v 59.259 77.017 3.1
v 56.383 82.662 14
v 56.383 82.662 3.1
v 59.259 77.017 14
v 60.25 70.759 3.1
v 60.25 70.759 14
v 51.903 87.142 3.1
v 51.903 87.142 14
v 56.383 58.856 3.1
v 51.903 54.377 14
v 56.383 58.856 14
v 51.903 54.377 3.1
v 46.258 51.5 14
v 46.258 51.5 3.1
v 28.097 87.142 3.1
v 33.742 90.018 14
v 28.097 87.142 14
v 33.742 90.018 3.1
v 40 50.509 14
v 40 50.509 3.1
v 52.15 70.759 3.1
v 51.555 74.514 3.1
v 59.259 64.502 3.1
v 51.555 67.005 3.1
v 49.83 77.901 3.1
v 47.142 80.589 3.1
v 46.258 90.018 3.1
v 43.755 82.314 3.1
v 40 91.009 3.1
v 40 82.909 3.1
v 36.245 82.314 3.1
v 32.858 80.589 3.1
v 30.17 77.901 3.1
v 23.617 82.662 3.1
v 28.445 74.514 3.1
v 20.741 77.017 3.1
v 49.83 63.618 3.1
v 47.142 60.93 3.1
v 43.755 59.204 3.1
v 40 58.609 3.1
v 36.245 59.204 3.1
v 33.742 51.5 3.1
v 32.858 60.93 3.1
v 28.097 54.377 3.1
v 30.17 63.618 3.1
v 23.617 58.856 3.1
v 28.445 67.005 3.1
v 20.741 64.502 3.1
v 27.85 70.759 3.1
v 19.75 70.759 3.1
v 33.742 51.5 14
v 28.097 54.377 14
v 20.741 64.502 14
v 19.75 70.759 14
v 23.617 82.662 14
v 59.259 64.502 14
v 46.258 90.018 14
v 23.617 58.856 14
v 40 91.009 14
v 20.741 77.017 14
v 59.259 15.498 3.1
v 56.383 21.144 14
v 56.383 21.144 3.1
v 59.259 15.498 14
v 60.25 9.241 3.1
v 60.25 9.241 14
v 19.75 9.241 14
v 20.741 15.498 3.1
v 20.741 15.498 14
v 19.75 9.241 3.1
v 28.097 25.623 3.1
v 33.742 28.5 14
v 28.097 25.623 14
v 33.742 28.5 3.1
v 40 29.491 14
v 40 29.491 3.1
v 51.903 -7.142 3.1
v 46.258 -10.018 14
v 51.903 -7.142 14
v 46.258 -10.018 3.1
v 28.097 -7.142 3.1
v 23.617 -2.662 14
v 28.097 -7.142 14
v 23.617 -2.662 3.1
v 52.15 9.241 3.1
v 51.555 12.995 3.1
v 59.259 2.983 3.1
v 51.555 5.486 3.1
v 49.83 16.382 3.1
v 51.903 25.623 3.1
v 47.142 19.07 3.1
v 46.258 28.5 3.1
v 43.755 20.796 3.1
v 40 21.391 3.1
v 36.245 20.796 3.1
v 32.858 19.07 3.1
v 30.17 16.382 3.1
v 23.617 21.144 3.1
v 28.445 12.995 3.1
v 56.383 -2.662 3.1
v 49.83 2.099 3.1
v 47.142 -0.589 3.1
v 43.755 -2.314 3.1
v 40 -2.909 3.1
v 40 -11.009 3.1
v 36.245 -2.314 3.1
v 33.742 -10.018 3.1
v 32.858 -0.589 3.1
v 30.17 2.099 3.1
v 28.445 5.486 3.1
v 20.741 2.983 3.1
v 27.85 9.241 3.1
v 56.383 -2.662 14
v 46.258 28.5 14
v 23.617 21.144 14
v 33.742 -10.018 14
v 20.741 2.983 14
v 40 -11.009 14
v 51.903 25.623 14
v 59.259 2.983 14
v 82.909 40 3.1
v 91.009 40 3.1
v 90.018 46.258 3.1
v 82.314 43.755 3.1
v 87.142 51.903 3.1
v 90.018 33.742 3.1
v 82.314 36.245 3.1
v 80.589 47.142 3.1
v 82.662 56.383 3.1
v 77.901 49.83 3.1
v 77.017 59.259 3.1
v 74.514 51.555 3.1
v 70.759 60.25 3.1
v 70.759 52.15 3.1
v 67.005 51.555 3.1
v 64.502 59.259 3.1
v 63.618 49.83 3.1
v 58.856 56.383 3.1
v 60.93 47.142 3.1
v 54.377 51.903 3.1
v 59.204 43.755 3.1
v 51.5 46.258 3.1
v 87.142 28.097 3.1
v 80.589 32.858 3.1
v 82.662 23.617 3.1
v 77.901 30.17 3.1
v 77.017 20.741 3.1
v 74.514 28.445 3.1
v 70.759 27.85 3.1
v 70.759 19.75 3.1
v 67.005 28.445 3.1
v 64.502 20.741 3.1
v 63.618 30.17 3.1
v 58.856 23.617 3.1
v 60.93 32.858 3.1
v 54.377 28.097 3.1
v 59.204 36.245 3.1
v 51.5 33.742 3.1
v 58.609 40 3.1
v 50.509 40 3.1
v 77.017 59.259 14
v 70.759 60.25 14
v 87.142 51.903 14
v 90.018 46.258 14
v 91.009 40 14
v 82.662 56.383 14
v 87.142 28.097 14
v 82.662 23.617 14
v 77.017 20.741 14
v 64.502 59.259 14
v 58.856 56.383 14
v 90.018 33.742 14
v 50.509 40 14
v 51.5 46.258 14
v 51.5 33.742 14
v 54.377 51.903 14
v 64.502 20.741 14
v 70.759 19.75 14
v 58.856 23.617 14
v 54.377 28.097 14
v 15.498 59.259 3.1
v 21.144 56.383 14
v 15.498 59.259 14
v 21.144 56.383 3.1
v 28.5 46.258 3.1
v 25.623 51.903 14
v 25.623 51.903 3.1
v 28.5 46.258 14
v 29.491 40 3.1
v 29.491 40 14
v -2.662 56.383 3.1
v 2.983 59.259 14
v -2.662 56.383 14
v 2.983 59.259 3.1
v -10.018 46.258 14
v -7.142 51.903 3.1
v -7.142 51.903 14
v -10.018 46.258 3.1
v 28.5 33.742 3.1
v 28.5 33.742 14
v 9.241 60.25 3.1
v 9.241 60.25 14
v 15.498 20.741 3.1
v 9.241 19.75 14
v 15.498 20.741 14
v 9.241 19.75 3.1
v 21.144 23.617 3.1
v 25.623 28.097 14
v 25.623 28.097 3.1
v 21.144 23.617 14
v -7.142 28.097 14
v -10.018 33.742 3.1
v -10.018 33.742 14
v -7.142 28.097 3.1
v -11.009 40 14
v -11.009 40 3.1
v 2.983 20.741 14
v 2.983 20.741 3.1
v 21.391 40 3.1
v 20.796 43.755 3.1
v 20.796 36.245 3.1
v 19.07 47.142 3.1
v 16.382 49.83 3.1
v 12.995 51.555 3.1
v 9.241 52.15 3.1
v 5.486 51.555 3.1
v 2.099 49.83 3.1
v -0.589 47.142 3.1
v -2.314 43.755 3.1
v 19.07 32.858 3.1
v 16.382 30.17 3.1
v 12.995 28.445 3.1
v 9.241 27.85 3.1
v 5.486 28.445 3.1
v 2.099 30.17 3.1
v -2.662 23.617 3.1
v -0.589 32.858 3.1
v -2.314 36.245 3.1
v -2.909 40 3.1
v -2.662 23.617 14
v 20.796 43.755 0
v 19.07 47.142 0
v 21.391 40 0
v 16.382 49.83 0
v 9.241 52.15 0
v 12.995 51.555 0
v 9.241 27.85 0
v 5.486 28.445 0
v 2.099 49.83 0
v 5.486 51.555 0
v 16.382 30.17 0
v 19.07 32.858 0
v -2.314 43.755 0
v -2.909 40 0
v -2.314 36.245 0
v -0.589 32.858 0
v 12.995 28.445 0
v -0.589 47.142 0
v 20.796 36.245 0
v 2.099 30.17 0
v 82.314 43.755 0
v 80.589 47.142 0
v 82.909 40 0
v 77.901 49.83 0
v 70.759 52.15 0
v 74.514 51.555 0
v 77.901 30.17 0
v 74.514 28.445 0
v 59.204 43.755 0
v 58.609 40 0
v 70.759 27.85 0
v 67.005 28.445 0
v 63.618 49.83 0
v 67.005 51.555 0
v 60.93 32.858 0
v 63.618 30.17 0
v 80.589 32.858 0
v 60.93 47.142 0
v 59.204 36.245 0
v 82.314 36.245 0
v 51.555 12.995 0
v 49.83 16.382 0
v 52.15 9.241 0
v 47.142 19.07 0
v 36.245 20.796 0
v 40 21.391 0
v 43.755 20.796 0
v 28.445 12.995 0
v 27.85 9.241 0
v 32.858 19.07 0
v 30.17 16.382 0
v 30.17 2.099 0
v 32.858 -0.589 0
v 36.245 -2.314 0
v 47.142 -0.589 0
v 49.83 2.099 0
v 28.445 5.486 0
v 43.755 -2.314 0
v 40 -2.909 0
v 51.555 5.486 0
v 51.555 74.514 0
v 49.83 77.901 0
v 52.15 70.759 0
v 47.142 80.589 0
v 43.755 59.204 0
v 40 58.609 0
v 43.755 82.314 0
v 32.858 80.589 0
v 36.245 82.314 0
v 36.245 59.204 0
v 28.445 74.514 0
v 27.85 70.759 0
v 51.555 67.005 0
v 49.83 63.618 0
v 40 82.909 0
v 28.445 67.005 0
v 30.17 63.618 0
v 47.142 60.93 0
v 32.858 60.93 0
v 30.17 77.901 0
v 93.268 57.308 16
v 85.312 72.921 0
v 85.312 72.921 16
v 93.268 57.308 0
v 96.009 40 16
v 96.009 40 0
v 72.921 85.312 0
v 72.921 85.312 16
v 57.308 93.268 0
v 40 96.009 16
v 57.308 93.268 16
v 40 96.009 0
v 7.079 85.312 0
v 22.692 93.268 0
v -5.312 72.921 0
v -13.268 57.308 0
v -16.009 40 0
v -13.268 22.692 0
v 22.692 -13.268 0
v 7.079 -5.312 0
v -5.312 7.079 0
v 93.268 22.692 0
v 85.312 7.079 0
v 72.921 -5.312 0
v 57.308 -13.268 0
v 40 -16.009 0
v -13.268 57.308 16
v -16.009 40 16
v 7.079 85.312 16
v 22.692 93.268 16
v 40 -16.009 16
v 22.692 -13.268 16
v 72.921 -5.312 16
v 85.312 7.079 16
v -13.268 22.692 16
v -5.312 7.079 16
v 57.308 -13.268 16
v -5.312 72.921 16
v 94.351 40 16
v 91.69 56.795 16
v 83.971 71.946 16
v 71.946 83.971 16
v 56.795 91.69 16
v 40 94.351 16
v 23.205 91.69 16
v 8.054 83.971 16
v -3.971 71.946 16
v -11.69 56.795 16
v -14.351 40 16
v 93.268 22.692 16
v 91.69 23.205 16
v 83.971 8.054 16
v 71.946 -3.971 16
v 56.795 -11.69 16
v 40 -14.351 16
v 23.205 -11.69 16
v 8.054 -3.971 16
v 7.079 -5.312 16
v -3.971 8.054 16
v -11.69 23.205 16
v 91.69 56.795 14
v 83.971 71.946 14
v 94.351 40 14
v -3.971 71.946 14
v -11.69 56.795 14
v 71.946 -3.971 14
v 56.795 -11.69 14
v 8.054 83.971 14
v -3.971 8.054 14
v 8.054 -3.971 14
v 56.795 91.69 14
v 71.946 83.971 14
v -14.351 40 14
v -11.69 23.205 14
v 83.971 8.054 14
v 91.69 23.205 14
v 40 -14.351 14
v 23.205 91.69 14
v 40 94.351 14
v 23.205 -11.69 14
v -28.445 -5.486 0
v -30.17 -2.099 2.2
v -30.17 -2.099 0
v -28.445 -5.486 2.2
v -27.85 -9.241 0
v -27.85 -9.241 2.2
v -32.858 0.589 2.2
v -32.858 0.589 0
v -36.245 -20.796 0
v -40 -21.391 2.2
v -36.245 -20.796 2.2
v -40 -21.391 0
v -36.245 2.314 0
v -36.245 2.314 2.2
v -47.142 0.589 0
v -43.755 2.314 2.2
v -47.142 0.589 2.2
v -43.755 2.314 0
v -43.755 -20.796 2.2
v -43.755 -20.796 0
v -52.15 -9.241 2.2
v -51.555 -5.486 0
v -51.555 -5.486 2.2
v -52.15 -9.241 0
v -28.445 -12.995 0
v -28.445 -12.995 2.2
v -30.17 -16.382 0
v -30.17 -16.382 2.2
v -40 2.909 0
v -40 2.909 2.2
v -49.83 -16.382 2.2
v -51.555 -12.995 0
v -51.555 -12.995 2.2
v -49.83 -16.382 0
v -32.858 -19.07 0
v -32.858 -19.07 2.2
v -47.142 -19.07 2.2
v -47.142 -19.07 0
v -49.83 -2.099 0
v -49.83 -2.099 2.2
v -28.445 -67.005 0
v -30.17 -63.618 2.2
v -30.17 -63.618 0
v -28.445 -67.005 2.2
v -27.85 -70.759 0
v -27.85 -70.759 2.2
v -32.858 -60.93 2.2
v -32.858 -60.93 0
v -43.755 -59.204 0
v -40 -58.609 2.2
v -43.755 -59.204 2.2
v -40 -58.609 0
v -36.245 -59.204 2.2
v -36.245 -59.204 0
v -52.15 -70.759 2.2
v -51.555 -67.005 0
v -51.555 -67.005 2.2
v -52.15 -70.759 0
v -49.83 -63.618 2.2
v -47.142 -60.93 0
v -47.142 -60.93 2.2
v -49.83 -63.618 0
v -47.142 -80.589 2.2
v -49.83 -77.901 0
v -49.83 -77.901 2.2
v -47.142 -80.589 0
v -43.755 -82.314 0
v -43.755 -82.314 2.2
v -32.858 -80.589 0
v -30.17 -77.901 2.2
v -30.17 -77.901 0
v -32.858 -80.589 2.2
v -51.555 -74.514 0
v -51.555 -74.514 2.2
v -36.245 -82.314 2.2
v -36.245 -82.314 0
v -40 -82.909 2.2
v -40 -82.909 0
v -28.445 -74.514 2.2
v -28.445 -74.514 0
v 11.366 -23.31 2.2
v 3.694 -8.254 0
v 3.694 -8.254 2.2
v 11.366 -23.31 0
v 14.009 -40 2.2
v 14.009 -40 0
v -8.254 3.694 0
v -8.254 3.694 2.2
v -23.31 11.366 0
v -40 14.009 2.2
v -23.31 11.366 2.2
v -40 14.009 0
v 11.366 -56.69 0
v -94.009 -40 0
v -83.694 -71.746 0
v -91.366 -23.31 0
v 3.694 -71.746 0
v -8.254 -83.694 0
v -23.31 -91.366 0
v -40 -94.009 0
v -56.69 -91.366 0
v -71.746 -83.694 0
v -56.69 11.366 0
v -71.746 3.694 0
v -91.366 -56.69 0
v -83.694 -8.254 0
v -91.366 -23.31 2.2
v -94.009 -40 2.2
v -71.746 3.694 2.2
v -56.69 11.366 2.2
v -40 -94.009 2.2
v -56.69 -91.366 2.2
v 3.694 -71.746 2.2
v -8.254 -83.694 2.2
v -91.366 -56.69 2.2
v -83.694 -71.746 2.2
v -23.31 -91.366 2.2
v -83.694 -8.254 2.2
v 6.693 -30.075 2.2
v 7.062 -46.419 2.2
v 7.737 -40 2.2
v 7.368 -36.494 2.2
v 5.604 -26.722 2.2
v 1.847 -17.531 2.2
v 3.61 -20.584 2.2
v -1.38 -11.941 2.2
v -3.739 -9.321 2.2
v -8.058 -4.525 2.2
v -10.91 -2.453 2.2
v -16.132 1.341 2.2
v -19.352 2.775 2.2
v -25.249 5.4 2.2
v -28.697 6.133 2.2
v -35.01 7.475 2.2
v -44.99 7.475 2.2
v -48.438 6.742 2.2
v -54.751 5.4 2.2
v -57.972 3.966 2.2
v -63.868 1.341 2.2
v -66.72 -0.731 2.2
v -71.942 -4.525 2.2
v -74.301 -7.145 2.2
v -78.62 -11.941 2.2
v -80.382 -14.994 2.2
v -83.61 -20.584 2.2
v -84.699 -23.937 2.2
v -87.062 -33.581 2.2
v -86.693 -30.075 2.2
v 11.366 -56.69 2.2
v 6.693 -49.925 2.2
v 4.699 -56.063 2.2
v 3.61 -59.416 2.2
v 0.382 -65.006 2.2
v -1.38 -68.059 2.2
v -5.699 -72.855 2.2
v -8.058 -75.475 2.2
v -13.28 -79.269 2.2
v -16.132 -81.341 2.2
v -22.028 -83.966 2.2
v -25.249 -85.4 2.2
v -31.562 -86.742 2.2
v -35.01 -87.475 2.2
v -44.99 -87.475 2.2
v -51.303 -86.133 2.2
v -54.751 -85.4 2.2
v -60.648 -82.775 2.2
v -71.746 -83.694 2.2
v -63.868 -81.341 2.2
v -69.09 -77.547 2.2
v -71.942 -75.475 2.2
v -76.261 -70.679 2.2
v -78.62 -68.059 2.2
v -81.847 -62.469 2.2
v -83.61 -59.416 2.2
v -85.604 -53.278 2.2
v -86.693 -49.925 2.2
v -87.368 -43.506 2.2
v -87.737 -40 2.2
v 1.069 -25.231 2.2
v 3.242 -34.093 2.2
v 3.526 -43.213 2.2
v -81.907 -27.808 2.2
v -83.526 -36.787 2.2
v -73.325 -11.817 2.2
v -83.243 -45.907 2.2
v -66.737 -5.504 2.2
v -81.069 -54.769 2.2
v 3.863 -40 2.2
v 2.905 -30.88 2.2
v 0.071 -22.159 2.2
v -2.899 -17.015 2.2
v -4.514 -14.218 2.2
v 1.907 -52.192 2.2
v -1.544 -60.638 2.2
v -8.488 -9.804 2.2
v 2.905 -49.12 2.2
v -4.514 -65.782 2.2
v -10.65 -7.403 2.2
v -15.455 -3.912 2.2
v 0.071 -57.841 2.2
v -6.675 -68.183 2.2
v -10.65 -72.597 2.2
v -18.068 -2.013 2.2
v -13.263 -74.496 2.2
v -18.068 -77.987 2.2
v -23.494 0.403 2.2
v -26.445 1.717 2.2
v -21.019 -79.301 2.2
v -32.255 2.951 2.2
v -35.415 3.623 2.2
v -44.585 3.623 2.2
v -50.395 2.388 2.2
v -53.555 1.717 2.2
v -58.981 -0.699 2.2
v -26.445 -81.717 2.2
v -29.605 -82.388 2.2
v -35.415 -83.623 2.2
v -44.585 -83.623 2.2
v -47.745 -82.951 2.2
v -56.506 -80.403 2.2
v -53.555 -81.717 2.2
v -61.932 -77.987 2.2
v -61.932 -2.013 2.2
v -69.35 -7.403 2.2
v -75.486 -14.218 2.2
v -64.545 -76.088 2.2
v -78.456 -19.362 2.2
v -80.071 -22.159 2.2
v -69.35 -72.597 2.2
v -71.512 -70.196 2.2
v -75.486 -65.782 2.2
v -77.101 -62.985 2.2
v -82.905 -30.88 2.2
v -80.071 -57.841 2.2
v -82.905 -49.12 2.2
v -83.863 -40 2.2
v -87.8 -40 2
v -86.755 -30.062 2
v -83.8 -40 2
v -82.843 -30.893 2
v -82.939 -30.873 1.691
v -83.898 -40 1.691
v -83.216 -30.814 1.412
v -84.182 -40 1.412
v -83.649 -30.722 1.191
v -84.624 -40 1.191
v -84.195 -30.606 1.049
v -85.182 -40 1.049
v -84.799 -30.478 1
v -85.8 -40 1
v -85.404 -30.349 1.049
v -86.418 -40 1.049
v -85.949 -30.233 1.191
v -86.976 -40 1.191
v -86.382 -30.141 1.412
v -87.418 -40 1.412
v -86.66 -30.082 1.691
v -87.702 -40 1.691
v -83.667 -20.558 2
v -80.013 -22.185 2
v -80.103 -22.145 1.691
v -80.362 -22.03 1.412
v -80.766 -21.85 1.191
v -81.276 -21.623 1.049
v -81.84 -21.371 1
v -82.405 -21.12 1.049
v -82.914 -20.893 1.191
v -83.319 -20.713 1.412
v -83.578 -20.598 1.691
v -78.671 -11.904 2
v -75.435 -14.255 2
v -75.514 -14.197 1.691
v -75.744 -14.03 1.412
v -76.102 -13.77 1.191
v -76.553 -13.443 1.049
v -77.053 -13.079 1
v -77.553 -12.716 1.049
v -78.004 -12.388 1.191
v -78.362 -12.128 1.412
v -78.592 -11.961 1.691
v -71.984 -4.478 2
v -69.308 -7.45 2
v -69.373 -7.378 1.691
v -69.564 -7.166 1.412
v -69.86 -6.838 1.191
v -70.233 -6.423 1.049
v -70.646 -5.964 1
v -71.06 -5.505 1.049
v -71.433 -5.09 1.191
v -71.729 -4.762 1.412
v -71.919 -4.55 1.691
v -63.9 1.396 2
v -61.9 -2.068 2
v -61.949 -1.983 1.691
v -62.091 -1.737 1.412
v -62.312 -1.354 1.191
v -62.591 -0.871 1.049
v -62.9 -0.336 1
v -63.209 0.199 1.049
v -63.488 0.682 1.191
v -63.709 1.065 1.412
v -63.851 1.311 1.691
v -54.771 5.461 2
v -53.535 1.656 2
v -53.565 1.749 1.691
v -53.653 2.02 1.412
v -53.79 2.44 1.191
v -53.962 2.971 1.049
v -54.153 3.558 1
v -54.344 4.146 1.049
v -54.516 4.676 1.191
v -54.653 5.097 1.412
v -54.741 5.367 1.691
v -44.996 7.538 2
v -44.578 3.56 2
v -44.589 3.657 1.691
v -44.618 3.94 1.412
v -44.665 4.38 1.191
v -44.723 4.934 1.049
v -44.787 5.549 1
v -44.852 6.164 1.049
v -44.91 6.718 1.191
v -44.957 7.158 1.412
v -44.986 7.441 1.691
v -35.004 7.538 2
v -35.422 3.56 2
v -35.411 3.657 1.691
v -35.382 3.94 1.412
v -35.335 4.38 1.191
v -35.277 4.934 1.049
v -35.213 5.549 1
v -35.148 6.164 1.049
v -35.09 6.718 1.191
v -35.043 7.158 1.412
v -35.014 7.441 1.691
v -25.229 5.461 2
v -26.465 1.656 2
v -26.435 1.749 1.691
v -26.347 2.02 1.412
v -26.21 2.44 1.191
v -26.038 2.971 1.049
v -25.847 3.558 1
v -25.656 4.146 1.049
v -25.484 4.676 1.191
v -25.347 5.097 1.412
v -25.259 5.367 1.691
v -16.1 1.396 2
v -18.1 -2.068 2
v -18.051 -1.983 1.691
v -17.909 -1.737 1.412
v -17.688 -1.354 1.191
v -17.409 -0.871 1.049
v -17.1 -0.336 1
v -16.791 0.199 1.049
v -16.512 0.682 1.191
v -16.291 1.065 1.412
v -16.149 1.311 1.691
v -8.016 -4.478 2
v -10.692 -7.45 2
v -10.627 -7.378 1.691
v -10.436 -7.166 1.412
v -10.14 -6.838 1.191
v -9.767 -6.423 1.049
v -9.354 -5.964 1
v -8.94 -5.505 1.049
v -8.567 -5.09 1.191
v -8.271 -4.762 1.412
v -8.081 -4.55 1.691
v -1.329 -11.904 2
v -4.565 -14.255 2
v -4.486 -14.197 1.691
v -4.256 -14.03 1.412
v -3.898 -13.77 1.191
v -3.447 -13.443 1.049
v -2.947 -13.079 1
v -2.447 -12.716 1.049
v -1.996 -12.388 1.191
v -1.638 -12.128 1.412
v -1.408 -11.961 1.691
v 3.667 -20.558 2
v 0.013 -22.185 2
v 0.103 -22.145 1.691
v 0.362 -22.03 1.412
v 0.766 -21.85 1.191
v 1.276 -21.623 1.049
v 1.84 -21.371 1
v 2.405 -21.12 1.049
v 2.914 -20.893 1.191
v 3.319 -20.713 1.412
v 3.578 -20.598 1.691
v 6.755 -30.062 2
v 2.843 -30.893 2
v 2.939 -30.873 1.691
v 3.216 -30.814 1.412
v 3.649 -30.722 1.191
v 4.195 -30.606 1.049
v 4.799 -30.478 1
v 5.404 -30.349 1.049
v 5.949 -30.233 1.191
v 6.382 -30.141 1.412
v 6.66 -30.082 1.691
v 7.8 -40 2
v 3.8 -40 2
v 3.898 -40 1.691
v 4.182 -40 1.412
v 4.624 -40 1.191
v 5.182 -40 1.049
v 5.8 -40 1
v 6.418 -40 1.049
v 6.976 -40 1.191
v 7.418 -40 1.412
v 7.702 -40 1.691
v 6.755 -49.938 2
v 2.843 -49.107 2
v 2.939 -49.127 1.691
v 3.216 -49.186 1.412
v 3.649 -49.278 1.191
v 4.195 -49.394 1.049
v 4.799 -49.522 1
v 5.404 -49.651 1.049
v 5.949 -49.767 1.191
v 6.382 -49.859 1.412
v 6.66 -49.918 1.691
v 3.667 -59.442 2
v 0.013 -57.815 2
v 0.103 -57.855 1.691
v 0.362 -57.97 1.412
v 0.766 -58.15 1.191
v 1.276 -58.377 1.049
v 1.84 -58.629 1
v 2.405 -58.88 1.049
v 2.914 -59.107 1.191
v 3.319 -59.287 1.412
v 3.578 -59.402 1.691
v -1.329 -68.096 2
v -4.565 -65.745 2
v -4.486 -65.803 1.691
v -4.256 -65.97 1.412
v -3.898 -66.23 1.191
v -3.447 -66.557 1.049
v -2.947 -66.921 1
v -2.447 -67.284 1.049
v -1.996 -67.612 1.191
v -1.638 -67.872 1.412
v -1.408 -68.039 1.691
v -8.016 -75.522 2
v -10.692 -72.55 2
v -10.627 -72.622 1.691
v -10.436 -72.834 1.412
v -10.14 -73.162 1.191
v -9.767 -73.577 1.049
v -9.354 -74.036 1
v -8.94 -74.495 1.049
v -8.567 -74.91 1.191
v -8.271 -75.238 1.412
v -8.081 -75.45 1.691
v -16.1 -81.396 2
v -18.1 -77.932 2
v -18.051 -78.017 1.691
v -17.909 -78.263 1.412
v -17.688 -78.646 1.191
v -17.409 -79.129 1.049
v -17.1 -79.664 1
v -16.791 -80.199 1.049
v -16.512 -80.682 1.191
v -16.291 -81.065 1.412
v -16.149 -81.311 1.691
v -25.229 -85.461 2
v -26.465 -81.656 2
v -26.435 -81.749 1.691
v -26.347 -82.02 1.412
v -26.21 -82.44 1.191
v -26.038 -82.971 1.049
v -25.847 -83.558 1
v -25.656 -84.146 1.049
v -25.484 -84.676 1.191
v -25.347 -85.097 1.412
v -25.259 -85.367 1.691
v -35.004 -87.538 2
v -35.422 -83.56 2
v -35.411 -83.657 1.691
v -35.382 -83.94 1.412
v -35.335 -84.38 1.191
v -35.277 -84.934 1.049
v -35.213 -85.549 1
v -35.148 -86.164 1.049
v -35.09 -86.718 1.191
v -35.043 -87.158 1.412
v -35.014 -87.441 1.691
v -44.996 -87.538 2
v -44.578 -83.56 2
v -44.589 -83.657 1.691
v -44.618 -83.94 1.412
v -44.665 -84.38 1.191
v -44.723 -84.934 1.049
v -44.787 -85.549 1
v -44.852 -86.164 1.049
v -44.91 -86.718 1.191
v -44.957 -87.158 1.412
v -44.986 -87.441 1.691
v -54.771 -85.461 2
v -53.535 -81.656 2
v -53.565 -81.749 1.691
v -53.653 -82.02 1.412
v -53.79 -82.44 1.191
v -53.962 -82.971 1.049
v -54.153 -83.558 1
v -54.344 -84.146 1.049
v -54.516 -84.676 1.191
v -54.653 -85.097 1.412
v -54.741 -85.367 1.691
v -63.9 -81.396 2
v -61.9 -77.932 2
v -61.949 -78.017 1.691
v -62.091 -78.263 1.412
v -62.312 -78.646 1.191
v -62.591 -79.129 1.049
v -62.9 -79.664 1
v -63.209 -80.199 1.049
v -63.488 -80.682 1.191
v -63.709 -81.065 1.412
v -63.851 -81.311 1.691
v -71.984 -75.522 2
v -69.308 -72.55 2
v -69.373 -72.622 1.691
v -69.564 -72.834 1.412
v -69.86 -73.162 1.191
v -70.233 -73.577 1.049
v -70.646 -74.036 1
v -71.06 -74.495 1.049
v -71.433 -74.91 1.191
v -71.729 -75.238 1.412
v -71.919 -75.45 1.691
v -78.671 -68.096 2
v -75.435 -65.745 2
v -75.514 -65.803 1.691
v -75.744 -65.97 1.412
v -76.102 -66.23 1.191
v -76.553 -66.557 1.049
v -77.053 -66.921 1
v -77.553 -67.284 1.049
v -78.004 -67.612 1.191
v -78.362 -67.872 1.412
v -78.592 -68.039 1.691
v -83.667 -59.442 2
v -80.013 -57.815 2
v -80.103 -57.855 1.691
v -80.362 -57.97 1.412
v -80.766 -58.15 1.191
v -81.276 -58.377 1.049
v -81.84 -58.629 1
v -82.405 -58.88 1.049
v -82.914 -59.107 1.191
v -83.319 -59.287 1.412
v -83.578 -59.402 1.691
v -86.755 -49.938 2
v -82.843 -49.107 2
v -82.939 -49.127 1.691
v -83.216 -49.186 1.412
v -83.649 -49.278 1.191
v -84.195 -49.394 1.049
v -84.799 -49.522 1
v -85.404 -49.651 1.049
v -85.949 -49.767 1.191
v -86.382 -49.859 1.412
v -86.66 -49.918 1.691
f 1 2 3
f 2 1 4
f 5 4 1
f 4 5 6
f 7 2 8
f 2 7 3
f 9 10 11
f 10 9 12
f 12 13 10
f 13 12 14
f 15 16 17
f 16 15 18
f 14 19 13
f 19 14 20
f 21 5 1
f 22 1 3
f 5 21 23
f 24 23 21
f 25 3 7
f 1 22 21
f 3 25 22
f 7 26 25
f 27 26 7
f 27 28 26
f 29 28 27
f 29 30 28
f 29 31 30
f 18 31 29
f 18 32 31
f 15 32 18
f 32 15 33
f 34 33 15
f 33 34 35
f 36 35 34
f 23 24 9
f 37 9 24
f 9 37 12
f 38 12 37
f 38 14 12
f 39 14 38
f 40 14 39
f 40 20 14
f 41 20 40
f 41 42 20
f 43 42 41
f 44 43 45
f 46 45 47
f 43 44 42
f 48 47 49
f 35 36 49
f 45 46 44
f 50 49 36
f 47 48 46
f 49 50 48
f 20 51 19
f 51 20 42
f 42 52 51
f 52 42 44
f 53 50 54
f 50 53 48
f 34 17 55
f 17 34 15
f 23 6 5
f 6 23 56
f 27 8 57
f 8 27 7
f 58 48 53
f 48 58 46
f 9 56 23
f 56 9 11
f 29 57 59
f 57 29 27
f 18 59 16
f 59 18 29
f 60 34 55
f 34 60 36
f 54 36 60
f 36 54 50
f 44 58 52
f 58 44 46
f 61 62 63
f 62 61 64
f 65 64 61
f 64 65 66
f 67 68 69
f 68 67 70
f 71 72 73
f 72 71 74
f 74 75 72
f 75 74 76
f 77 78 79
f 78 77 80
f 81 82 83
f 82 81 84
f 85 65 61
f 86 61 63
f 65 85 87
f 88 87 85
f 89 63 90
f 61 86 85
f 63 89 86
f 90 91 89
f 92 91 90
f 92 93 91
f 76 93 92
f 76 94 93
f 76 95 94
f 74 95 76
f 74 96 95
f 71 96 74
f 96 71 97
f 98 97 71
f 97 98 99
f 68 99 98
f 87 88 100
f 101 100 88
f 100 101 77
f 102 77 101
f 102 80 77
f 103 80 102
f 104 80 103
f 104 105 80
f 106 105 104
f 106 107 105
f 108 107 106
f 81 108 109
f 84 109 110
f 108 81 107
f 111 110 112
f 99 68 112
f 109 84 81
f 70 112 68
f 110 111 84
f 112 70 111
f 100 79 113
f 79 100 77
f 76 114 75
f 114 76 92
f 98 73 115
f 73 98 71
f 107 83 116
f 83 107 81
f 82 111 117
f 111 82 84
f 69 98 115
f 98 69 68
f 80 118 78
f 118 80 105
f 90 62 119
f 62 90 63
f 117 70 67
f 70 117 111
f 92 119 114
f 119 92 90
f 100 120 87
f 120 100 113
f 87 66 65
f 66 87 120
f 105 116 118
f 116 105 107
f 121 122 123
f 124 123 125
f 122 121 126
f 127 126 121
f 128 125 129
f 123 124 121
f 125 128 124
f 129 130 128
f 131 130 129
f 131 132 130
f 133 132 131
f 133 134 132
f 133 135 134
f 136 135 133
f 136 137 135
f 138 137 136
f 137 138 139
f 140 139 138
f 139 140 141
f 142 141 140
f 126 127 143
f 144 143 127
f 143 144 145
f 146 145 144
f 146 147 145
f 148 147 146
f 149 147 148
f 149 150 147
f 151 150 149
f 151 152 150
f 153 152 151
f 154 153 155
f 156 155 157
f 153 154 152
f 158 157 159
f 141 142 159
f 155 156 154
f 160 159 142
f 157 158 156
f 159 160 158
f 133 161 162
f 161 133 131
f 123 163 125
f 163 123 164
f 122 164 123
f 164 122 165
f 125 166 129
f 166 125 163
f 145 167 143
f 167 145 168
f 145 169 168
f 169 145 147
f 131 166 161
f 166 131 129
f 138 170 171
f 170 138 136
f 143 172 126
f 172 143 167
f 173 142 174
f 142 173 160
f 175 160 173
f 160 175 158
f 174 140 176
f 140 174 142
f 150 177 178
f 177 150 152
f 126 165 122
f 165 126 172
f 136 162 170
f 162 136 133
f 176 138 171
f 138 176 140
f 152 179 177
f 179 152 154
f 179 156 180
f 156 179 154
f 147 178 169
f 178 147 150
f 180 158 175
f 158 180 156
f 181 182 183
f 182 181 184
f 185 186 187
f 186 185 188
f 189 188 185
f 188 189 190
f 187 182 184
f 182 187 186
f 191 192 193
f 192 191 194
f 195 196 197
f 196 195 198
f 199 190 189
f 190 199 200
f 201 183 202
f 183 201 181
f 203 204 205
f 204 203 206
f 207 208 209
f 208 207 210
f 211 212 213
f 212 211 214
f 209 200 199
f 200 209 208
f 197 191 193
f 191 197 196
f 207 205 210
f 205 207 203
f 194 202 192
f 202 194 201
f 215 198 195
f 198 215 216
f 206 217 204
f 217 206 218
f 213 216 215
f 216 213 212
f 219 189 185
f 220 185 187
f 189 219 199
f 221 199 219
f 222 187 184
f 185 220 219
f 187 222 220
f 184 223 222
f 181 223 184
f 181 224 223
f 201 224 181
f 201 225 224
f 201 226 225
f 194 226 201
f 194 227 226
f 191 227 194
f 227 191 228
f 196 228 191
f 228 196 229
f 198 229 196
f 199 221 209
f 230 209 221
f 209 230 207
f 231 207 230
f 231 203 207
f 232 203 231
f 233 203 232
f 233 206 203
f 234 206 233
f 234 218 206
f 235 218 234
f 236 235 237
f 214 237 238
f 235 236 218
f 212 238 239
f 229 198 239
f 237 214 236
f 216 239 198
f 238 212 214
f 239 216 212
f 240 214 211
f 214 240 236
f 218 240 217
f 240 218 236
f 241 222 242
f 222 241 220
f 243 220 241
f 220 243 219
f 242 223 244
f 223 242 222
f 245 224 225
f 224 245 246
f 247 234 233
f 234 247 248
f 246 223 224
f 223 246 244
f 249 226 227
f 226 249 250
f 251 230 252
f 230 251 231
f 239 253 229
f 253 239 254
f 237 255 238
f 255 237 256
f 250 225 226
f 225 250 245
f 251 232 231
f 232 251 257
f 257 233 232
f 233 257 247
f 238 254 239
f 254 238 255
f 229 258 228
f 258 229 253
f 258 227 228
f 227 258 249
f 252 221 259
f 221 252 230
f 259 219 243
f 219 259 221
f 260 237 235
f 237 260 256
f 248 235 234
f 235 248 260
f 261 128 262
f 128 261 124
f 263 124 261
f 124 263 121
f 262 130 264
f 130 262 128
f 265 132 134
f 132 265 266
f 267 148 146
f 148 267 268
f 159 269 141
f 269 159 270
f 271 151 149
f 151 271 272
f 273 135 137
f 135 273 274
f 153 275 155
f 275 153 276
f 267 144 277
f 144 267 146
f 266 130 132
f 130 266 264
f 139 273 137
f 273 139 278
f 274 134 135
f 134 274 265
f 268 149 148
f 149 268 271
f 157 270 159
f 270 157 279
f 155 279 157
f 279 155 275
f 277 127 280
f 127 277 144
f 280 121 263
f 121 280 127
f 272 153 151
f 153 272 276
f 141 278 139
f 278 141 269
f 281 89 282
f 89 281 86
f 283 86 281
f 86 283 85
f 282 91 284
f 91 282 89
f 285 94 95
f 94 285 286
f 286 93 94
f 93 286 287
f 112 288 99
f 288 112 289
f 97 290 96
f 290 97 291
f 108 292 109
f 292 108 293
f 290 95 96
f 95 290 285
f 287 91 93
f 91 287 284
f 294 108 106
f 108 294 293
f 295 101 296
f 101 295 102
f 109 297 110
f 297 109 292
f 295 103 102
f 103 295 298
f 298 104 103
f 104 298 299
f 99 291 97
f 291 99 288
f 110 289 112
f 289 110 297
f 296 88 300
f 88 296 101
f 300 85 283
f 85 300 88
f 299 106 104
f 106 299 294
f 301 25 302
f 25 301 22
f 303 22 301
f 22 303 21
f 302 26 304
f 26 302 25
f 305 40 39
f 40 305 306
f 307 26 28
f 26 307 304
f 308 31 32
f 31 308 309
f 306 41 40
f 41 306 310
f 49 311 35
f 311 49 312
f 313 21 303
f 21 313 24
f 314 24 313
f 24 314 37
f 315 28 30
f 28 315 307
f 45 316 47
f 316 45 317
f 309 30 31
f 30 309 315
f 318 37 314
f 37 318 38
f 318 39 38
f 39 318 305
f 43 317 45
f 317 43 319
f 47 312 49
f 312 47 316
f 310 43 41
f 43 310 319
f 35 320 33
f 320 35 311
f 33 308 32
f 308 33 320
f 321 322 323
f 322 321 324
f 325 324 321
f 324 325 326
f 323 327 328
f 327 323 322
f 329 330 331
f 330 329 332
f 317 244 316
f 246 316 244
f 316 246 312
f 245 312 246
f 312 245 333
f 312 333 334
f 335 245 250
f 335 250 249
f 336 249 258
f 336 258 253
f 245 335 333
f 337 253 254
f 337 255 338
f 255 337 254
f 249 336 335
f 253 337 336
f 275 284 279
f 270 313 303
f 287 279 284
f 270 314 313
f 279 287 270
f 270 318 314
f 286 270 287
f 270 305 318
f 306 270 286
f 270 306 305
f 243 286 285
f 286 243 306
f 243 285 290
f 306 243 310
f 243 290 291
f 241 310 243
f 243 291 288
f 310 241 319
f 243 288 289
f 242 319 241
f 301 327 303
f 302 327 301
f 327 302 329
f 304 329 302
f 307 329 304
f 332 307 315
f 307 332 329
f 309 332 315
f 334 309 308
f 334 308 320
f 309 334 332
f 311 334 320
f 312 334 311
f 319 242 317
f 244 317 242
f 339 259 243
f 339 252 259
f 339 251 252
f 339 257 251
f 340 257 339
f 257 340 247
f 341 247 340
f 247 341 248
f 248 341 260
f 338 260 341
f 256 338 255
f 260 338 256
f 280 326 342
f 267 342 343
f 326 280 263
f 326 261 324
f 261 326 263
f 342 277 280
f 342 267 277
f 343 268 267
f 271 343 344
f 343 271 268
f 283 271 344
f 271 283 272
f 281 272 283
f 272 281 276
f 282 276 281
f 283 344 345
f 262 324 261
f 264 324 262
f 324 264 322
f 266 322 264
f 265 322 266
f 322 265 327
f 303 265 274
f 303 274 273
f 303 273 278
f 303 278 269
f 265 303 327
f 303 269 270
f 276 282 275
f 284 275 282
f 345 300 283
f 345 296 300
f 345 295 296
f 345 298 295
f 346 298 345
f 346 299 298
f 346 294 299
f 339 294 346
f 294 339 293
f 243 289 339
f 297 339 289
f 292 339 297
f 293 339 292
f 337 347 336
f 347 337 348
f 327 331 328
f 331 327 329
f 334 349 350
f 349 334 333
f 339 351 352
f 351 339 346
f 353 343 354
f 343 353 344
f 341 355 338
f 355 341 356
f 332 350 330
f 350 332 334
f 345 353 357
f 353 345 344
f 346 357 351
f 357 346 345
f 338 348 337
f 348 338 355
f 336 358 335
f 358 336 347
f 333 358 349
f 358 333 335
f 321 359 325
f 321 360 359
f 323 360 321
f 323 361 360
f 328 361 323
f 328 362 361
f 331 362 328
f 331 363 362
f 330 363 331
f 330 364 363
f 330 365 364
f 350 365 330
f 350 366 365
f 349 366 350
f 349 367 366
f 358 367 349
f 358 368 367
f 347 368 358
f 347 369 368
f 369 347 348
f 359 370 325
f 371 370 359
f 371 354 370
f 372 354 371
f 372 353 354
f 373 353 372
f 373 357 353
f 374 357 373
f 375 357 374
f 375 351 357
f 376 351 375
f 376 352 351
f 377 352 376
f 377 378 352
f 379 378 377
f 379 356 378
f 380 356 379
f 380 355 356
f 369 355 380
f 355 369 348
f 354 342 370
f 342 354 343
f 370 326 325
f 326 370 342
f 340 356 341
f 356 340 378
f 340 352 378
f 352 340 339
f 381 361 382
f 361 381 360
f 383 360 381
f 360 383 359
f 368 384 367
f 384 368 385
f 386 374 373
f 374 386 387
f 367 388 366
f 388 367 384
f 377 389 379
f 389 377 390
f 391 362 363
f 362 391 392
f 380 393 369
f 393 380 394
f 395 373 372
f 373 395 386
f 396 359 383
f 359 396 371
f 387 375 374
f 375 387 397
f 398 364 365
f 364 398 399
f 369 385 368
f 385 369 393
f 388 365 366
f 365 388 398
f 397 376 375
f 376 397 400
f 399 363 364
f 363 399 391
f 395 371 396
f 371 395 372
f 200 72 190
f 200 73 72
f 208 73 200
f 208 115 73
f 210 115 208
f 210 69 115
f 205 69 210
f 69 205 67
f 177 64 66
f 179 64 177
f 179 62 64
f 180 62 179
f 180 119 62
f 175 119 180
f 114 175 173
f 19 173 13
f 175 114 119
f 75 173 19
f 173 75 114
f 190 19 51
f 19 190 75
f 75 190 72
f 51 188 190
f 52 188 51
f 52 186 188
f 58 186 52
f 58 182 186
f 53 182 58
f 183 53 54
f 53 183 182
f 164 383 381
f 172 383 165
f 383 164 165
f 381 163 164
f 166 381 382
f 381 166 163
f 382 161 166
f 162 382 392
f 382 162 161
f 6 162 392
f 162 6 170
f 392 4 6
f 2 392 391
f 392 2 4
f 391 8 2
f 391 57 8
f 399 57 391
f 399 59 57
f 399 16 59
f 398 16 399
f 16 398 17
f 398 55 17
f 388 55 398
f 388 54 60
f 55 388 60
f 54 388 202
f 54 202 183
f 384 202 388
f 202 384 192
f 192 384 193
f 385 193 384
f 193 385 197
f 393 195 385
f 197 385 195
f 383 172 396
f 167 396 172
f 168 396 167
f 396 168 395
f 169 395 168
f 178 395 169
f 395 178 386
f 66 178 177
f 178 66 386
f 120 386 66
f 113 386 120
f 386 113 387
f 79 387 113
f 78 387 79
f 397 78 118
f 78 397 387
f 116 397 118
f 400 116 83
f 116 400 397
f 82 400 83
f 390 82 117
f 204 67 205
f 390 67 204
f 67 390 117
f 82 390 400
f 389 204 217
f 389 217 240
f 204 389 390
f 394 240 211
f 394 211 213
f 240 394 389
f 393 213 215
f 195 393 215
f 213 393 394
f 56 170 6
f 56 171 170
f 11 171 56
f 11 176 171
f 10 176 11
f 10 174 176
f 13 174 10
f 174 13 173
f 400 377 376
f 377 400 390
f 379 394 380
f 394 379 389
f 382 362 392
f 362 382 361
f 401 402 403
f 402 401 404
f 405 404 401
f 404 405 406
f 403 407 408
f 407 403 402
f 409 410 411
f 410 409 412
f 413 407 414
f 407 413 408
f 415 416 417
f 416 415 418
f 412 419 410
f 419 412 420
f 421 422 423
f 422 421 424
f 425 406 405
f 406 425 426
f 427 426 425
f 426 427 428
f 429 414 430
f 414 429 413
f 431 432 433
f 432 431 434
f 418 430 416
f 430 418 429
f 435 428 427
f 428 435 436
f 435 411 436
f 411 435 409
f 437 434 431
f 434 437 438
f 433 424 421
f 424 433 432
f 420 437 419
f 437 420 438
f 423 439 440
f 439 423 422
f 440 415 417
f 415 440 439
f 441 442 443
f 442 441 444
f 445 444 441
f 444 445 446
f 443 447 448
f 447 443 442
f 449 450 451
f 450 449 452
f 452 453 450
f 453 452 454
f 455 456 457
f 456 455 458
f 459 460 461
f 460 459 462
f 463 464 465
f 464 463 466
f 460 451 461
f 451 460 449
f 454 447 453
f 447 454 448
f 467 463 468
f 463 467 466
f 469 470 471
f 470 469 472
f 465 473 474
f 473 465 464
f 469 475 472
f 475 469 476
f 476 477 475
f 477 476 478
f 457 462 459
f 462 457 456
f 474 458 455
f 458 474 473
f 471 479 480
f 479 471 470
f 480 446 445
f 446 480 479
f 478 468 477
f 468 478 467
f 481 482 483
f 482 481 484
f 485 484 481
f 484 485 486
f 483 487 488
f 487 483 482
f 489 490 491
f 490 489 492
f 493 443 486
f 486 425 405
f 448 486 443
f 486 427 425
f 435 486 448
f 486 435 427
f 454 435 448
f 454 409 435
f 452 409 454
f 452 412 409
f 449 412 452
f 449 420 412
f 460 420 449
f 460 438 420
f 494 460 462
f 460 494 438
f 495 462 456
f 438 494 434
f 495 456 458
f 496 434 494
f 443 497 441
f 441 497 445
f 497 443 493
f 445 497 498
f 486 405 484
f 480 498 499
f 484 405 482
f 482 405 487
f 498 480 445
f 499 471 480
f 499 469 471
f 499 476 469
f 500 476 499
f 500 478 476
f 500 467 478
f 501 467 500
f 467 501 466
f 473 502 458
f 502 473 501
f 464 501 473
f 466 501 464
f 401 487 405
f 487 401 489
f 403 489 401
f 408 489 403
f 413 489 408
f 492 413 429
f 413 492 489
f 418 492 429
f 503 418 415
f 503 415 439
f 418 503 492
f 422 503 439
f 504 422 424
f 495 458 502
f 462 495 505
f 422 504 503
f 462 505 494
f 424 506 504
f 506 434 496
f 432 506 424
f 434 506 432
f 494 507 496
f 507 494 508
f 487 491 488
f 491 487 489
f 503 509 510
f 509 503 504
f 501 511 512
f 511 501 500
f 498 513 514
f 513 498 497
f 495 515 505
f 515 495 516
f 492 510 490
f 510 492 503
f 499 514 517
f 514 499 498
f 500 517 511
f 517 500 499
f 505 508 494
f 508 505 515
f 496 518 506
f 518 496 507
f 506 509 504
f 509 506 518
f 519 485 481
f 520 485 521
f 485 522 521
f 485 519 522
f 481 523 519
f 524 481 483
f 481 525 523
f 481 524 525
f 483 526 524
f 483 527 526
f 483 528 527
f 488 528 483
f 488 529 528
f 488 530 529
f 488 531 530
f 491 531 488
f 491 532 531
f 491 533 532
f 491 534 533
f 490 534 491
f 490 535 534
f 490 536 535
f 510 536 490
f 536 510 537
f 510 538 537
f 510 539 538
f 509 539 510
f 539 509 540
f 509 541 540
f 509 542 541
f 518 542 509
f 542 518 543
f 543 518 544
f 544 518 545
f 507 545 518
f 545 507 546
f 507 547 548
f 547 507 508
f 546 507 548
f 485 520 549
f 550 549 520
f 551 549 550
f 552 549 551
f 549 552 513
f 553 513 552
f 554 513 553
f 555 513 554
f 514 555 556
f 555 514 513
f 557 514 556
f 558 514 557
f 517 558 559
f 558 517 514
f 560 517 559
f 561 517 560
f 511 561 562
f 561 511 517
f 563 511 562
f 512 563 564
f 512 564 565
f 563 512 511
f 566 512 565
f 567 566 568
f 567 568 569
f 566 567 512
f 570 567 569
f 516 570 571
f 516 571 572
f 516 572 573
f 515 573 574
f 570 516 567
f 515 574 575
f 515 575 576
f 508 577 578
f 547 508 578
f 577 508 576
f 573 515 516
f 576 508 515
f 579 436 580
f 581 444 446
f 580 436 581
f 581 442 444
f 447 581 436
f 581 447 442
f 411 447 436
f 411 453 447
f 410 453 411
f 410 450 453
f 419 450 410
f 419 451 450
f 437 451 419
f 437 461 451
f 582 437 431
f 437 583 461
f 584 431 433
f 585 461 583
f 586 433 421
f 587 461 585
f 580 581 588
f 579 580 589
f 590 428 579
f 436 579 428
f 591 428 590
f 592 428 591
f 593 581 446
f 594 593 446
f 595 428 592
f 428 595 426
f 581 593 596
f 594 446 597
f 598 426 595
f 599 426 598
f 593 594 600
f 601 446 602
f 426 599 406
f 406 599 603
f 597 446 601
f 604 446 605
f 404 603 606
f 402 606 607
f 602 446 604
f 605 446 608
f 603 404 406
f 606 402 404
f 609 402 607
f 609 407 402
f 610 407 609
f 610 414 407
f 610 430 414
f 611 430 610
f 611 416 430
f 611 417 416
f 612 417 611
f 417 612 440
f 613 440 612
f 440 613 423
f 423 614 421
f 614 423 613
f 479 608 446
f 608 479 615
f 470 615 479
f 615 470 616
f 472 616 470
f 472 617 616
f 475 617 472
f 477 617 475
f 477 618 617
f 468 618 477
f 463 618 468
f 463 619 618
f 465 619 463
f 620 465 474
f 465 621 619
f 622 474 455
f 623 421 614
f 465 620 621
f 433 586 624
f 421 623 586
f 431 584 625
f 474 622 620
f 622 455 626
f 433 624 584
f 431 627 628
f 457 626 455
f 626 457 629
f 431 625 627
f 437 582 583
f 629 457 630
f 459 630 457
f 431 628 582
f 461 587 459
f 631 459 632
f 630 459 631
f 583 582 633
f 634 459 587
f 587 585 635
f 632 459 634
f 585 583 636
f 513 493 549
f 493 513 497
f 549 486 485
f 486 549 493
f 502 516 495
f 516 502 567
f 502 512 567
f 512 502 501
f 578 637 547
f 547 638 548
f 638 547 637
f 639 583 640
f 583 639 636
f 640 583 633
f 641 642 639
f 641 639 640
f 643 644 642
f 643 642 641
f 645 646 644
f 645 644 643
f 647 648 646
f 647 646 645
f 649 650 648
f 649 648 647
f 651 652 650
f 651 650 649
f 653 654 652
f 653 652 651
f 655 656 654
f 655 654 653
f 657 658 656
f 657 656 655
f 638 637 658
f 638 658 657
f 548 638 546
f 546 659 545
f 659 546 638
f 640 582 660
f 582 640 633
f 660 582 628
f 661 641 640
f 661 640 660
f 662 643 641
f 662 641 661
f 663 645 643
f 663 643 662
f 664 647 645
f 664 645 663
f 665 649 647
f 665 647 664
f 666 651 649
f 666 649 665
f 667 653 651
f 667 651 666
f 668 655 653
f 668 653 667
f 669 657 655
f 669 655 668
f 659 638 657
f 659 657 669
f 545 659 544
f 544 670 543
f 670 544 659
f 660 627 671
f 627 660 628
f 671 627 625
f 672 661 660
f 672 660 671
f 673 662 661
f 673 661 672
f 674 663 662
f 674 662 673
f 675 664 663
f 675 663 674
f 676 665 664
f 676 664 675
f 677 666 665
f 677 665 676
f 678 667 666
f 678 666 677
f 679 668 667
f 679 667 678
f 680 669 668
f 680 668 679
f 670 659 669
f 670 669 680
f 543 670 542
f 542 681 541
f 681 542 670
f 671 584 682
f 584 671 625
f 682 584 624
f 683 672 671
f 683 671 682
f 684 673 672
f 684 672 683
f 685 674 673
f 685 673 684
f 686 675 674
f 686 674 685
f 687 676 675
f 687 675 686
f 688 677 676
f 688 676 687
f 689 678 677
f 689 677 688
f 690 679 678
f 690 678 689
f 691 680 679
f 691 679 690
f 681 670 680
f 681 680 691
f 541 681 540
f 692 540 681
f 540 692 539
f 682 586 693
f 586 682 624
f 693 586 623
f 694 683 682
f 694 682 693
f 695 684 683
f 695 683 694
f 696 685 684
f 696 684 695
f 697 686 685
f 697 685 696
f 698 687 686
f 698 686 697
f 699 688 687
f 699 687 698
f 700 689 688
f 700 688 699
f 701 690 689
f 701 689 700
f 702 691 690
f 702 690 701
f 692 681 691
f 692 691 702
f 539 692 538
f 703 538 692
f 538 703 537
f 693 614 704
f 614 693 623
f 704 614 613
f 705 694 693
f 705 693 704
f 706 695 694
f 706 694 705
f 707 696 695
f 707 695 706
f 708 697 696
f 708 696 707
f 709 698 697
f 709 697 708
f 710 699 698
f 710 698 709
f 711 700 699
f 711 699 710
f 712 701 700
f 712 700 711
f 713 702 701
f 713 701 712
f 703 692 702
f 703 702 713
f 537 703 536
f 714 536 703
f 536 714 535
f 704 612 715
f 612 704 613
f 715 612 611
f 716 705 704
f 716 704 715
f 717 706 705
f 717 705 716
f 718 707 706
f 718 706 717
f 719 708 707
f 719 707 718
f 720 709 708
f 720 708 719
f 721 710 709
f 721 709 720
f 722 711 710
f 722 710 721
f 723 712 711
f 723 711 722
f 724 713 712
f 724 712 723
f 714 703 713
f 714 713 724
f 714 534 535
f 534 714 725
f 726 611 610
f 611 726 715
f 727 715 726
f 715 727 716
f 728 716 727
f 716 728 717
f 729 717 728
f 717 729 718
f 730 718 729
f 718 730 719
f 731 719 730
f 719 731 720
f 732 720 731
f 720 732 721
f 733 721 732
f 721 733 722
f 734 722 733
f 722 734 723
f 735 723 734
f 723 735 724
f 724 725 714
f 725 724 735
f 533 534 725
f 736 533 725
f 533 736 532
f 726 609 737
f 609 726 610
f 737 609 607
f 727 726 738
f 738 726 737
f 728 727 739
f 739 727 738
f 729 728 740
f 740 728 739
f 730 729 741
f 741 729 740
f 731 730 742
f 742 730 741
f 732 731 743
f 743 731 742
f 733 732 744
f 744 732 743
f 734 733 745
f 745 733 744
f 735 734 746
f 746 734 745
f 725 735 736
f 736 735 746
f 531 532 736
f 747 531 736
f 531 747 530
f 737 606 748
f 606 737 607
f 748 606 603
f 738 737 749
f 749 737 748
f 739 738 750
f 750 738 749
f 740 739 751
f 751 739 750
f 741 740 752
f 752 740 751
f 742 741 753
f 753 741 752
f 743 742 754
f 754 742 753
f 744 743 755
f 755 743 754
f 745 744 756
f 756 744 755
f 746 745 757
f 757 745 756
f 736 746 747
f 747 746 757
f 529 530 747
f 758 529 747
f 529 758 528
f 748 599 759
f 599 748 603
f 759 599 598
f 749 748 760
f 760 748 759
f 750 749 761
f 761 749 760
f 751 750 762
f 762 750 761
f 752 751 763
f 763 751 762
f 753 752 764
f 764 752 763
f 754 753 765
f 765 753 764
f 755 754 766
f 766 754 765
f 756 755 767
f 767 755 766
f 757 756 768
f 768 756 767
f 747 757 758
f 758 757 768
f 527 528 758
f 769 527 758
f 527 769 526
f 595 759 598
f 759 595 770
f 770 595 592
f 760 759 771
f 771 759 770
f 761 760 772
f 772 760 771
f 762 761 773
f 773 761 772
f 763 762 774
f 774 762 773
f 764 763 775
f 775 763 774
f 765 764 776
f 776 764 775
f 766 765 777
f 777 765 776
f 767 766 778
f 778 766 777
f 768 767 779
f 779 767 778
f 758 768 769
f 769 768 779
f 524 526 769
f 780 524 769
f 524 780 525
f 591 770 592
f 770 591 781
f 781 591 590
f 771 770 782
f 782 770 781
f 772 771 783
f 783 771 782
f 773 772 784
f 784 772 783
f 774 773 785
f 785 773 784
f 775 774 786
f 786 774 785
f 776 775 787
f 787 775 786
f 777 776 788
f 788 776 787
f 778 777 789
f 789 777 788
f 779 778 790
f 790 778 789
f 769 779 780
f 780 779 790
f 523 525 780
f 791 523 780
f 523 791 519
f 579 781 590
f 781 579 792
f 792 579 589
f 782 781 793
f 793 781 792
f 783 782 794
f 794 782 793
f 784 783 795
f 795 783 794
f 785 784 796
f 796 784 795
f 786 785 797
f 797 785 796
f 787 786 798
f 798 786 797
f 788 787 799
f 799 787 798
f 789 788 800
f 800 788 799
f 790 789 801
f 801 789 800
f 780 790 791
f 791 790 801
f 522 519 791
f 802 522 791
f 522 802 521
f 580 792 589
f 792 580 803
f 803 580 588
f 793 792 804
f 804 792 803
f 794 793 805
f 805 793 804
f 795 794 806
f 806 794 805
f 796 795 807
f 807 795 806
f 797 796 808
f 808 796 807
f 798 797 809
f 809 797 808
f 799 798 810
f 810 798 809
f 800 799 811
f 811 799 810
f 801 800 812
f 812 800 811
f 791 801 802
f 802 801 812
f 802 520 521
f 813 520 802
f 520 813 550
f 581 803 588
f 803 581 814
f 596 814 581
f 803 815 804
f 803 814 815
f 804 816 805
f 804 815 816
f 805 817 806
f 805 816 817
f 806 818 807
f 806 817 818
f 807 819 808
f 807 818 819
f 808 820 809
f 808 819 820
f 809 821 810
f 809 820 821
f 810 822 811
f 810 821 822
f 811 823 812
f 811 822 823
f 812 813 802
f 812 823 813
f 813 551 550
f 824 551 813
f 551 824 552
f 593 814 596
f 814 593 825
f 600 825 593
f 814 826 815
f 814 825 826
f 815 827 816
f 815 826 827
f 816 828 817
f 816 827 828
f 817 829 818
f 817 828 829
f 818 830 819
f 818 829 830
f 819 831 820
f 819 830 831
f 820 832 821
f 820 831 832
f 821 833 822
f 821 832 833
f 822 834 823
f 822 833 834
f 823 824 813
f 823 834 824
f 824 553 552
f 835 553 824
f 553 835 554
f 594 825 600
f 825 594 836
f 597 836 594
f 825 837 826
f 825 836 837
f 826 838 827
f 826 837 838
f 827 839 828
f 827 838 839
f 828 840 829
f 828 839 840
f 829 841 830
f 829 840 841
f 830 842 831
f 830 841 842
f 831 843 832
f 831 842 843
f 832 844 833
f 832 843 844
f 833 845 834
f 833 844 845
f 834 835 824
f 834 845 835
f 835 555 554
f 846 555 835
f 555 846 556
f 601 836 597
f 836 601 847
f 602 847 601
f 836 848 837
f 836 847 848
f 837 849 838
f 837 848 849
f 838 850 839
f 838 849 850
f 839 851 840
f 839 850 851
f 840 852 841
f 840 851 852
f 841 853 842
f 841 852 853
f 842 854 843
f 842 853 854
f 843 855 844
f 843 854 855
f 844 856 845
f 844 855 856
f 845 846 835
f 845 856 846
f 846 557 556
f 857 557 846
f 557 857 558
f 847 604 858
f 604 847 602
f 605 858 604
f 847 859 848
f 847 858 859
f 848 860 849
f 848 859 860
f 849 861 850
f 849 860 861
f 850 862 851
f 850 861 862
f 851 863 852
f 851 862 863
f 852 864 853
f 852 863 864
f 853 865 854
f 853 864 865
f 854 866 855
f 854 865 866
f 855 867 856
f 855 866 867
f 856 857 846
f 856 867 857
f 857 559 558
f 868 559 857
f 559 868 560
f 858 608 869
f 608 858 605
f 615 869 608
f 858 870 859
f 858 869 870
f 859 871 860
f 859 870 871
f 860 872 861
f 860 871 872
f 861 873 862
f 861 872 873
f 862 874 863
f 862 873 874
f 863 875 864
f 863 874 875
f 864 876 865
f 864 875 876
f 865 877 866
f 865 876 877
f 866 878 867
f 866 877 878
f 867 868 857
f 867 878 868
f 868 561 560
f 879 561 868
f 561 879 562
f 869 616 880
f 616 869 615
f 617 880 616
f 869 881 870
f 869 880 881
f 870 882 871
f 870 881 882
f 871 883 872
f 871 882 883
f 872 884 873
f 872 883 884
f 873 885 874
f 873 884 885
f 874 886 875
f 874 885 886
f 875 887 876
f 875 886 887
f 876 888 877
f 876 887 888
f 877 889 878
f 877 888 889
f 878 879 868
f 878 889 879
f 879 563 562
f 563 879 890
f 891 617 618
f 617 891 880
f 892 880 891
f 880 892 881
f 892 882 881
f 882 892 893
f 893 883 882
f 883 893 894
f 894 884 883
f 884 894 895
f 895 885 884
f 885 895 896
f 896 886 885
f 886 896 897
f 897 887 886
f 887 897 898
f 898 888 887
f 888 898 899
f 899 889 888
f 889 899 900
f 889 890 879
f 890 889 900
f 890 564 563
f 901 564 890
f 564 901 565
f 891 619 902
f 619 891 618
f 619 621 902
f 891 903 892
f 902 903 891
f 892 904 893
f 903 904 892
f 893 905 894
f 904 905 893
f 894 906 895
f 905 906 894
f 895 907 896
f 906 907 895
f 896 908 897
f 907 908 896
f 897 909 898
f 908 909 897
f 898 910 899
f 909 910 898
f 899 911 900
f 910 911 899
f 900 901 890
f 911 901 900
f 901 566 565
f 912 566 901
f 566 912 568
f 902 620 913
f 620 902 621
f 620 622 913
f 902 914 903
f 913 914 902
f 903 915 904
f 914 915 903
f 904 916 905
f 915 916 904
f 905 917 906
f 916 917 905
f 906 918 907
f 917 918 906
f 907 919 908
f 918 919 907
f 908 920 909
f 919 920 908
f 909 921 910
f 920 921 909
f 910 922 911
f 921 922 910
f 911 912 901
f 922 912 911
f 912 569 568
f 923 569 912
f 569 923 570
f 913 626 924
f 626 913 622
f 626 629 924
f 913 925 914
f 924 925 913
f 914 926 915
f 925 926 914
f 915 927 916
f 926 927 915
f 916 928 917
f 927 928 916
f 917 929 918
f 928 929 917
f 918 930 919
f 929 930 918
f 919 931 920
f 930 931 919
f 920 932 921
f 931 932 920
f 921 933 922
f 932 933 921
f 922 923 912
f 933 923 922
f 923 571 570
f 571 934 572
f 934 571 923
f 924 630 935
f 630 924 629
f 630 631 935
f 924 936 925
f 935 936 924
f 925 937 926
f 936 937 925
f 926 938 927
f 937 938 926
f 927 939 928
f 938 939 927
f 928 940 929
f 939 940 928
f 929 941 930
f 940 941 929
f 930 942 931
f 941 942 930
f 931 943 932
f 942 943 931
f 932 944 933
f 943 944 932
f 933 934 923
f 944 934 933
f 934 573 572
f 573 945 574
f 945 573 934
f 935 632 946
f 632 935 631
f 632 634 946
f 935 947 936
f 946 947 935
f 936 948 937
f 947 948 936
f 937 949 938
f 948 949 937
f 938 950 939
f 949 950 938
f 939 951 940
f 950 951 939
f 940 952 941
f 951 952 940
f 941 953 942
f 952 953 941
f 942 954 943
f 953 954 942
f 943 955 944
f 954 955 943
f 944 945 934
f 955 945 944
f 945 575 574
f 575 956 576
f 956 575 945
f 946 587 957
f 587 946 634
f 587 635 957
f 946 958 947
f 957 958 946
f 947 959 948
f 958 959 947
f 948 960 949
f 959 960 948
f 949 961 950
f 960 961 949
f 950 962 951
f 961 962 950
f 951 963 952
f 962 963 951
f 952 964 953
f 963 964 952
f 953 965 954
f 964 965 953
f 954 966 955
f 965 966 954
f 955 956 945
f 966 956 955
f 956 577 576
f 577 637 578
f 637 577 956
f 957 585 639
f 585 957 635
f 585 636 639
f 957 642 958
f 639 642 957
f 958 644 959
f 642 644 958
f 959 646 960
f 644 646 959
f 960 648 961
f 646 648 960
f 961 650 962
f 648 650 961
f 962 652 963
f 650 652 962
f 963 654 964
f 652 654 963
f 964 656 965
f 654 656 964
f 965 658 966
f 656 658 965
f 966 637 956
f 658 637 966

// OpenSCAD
// dist units: mm

//global config
parts_sep = 40; // how much to separate the top and base
eps =0.1; // nudge amount
hewn=20; // how fine should the models be? small for protyping, large for rending
//
//  base config
//
//  //  well config
well_dia = 40.5; // diameter of the food well. Currently set to contain a 3.5 cm petri dish & allow for a 3.8 cm cover to be added while in well
well_rad = well_dia/2; // r: radius of the food well
well_depth=11; // depth of the food well. Currently set to fit flush against the top of a 1.1 cm petri dish.

//
//  //  wall config
wall_thick = 3; // wt: wall thickness between wells
bottom_thick = wall_thick; // the thickness of the bottom of the disk
//
//  //  lip config
lip_thick = 2; // lt: how far past the base does the lip extend?
lip_overhang = 2; // lo: how far down the base does the lip extend?
//
//  stage config
rad_cont = 0.6; // rc: how much smaller is the entry port than the well? Also controls the under-well access spots atm
//
//  // groove config
grv_rad = 45.8; // radius of groove
//grv_dpth = lip_overhang/2; // depth of groove (in this case, also half the width of the groove)
grv_wdth =4;
grv_dpth = grv_wdth/2;

// define a well
module well(x,y,d,r){
     translate([x,y,0]) cylinder(r=r, h=d, $fn = hewn);//, center=true) ;
}

// define four evenly spaced wells
module allswell(d,r, wt){
    cntr = (r + wt/2)*sqrt(2.0); // calculate the centering coord
    union(){
    well(0,cntr,d,r);
    well(0,-cntr,d,r);
    well(cntr,0,d,r);
    well(-cntr,0,d,r);}
   translate([0,0,-(2*bottom_thick+eps)]) union() {well(-cntr,0,d,rad_cont*r);
       well(cntr,0,d,rad_cont*r);
       well(0,-cntr,d,rad_cont*r);
       well(0,cntr,d,rad_cont*r);
   }
}

// define the Big Disk holding the wells
module metawell(d, r, wt, bt, lt, lo){

    translate([0,0,-(bt+eps)]) cylinder(d=(2+2*sqrt(2.0))*r + (2+sqrt(2.0))*wt + 2*lt , h=d+bt+lo, $fn = hewn) ;

    }

module stage(r,wt,lo){
    cylinder(d=(2+2*sqrt(2.0))*r + (2+sqrt(2.0))*wt, h=lo+2*eps, $fn = hewn) ;
}


module punches(d,r,wt,rc){
    cntr = (r + wt/2)*sqrt(2.0); // calculate the centering coord
    well(0,cntr,d,r*rc);
    well(0,-cntr,d,r*rc);
}

//well(0,0,well_depth, well_rad);

//allswell(well_depth, well_rad, wall_thick);

//metawell(well_depth, well_rad, wall_thick, bottom_thick);
    
module allYourBase(d, r, wt, bt, lt, lo){

    difference(){
        difference(){
            metawell(d, r, wt, bt, lt, lo);
            allswell(d, r, wt);// scoop the food wells out
    }

        translate([0,0,well_depth-eps]) stage( r, wt+2*eps, lo); // scoop out the stage pit

    }
}
       

module punchedStage(r,wt,lo,rc){
    difference(){
    stage(r, wt, lo);
    translate([0,0,-0.5*eps]) punches(lo+3*eps, r, wt,rc);
    }
}


module groove(gr, gd, gw){
    rotate_extrude() translate([gr, 0, 0]) scale([gw,gd,1]) circle(r = 1/2, $fn = hewn);
}


module groovyPunchedStage(r,wt,lo,rc,gr,gd,gw){

    difference(){
        punchedStage(r, wt, lo, rc);
        translate([0,0,lo]) groove(gr, gd,gw);
    }
    
    
}



translate([parts_sep,parts_sep,bottom_thick+eps])  allYourBase(well_depth, well_rad, wall_thick, bottom_thick, lip_thick, lip_overhang);

 translate([-parts_sep,-parts_sep,0])groovyPunchedStage(well_rad,wall_thick,lip_overhang, rad_cont, grv_rad, grv_dpth, grv_wdth);
